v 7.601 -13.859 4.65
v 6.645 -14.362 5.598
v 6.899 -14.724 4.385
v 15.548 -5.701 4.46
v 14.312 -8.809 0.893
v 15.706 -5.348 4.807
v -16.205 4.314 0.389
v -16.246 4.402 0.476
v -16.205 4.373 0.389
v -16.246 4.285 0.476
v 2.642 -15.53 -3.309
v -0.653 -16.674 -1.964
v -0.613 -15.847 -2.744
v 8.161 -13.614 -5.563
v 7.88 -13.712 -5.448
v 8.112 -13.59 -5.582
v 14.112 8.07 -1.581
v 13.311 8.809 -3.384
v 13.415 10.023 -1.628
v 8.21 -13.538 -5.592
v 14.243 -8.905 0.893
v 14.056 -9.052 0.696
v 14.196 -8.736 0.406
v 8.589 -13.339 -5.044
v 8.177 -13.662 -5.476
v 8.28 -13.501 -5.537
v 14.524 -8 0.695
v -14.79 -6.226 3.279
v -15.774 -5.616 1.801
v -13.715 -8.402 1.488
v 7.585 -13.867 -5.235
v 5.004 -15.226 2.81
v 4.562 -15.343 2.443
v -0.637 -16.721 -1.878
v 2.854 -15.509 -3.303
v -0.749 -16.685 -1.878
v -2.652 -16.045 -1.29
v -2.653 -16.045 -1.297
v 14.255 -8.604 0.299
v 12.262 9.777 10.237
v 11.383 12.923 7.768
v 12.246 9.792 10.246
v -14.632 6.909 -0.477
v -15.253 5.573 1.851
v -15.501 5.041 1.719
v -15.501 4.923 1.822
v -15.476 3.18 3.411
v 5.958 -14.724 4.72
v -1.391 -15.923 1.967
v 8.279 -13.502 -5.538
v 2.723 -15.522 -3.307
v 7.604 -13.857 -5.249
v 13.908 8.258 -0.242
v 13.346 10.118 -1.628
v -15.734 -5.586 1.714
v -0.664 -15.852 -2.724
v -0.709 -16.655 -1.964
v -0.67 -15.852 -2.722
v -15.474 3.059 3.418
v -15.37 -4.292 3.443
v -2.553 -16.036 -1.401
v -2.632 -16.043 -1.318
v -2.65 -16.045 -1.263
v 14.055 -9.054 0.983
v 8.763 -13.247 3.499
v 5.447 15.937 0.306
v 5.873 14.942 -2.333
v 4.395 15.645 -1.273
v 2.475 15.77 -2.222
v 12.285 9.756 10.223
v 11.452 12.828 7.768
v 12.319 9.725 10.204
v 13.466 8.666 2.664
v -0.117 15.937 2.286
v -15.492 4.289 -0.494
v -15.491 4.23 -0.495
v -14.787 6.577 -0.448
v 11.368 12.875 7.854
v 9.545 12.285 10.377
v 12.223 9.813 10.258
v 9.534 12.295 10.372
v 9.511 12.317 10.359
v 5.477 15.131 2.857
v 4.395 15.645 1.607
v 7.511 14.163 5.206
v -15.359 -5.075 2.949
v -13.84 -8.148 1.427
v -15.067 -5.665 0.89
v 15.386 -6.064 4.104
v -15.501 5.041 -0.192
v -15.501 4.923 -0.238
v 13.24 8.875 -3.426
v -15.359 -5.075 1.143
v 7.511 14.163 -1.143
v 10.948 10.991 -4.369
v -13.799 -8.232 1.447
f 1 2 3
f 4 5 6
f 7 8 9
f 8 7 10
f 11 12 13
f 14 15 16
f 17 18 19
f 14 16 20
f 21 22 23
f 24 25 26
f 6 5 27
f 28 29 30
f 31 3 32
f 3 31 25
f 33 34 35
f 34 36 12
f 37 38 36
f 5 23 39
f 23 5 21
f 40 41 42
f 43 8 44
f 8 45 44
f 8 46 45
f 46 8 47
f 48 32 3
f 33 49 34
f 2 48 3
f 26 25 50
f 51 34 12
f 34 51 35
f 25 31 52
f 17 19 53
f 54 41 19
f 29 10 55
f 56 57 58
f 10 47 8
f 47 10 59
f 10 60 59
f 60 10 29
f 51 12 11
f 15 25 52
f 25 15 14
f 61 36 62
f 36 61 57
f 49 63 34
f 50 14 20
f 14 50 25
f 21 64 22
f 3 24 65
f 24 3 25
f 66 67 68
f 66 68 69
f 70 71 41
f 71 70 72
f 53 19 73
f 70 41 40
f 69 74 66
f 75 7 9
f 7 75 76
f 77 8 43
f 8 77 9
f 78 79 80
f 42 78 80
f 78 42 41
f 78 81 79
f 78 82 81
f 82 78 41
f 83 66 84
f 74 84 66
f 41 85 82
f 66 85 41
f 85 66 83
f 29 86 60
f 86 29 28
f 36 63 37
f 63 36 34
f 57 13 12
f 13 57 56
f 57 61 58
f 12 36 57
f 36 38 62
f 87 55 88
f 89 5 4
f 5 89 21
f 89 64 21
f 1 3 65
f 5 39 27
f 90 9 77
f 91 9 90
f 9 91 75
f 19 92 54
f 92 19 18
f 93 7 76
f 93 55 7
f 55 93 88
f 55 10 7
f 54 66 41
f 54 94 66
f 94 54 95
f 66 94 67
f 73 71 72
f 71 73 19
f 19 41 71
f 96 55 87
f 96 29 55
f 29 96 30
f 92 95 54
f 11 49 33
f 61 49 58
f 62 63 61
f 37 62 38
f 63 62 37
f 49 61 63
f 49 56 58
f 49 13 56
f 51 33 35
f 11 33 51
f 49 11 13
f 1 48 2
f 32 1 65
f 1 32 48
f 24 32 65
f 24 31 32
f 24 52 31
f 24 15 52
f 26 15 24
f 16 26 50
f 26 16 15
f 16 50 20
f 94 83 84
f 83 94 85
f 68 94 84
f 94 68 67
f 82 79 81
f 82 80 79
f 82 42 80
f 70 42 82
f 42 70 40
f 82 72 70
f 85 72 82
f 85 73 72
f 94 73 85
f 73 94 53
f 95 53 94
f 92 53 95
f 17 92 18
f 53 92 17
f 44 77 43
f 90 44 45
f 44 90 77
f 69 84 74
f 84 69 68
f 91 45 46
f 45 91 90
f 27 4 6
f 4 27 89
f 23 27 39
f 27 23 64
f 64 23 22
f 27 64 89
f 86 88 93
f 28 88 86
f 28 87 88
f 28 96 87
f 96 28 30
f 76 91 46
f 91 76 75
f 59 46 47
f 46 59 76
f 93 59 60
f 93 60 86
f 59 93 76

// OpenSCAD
// Auto-generated OpenSCAD file

    inner_points = 10*[[0.9785360441964507, 0.9685060087804973, -0.7092049571073851], [-0.7218333121630555, -0.9371211507350073, 1.2781211700972077], [-1.1656165136305032, 1.3079692585994611, 0.41648198007898896], [0.12642830900148935, -1.3068898411312557, -0.9853981930688116], [-0.22333094402334933, 1.5535674106354085, 0.6440329700277245], [1.005476703886223, -0.9333113753571688, -0.6892343037094695], [-0.7487739718528278, 0.9646962334026586, 1.2581505166992923], [0.4800336760567444, -1.5221825525899184, -0.07511675703790183], [0.08934767207892022, 1.3107372224336087, -1.012885439345699], [0.48861147976637076, 0.5027013227208416, -1.446090236925663], [-1.5277996843953847, -0.5016219052526364, 0.8771740239358404], [-1.128535876707934, -1.309657804965403, 0.4439692263558762], [0.43644277299934864, 1.5550226153402404, -0.10742995301327285], [1.1958876650432781, 0.018046999695751874, -0.9314344442707686], [-0.939184933009883, 0.013337858349738127, 1.5003506572605914], [-0.17974004096595367, -1.5236377572947502, 0.6763461660030955], [-0.5425111962571489, 1.6183222038887703, -0.3014461589511666], [0.5027750227462976, -0.4971432456893552, -1.4355910431050312], [-1.5419632273753114, 0.4982226631575605, 0.8666748301152085], [-0.4966770083718649, -1.617242786420565, -0.2674700540386561], [1.4826091915535184, 0.7286877016062595, 0.809489031294333], [0.6324245133737653, -0.22412587815149274, 1.8031520948966295], [1.6999608124003458, -0.22177130747848592, 0.5872595441309494], [1.1745177845708672, -0.8106424847112358, 1.2013770908025172], [0.8228354745308205, 0.7272324969014278, 1.5609519543353303], [1.6251024487516763, 0.45780294600218496, -0.14251785987525334], [0.24947474274244444, -1.083881810988317, 1.4652627503986109], [0.7479771108821508, 1.4068067503820987, 0.8311745503291275], [-0.10220756729760253, 0.45399317062434624, 1.824837613931424], [1.317011041769025, -1.0815272403153102, 0.2493701996329309], [-1.0994824342008114, 0.7998110906252263, -0.4422389058083036], [-0.453460022884815, -0.5076184592401323, -1.1431789923822038], [-1.4758291479456198, -0.00993550481667447, 0.007953944227915899], [-1.0765653402581692, -0.8179714045294413, -0.42525085335204815], [-0.4676235658647422, 0.4922261091700644, -1.1536781862028358]];

    outer_points = 10*[[1.6675078734833215, 0.0606578658798944, -0.14037183476169734], [-1.3812010323162374, 0.0606578658798944, 0.9447594765080658], [-0.21947760683013753, 1.5412866403759968, -0.6166289071353418], [-0.0668292343369466, -1.6626023721357857, -0.1877587346110266], [0.5416162372999497, 1.5841976272977822, 0.030591926605881947], [0.6867934666614489, -1.4628818955379934, 0.4384716988297587], [-0.40048662549436476, 1.5841976272977822, 0.36591594291660967], [-0.2553093961328655, -1.4628818955379934, 0.7737957151404864], [1.2830083443582905, 0.43437021059876024, -0.9844685090279552], [1.3301792856223638, -0.5556859423585491, -0.8519403373374261], [-1.616486126789448, 0.43437021059876024, 0.047552695591057736], [-1.5693151855253746, -0.5556859423585491, 0.1800808672815868], [1.3315198473616163, 1.0022572216480545, -0.16279279637858096], [1.421244309499562, -0.8809414898882658, 0.08929076617934018], [-1.1349374683324778, 1.0022572216480545, 0.7150968755670284], [-1.0452130061945322, -0.8809414898882658, 0.9671804381249495], [0.6910920823419752, 1.2353424637267059, -0.8945875406321075], [0.814587209852644, -1.3566581954864947, -0.5476242826794208], [-1.100894051019728, 1.2353424637267059, -0.25676335906694764], [-0.9773989235090593, -1.3566581954864947, 0.09019989888573907], [1.3498755222367103, 0.5145289147819359, 1.3798731287754311], [-0.1744789306630692, 0.5145289147819359, 1.9224387844103128], [1.1036119582529507, -0.4270704409862244, 1.6095357297164685], [0.16150909545863612, -0.4270704409862244, 1.9448597460271964], [0.5599719121750438, 1.0964693204316633, 1.573257851759894], [1.6788523044425723, -0.24077480503880566, 0.8130481402697834], [-0.7876050112515218, -0.24077480503880566, 1.6909378122153926], [1.1352122583646653, 1.2827649563790822, 0.7767702623132089], [-0.38914219453511406, 1.2827649563790822, 1.3193359179480906], [0.4904858776644981, -1.182374160806966, 1.3780347575215486], [-0.10820638536813701, 0.6663583620181512, -1.0879241680961655], [-0.03188219912154147, -0.93558614423774, -0.8734890818340078], [-0.9896228295577276, 0.3604141853688603, -0.7280586200277711], [-0.9424518882936543, -0.629641967588449, -0.595530448337242], [0.483709876648178, -0.13461389110979438, -1.177805136492013]];

    // Convex hull for inner set (I)
    module inner_hull() {
        hull() {
            for (p = inner_points) {
                translate(p) sphere(r=0.1);
            }
        }
    }

    // Convex hull for outer set (O) minus inner hull (O \ I)
    module outer_minus_inner() {
        difference() {
            hull() {
                for (p = outer_points) {
                    translate(p) sphere(r=0.1);
                }
            }
            inner_hull(); // Subtract inner hull
        }
    }

    // Convex hull for outer set (O) minus all translated inner hulls
    module outer_minus_AllTranslationInner() {
        difference() {
            hull() {
                for (p = outer_points) {
                    translate(p) sphere(r=0.1);
                }
            }
            hull() {
                translate([0,0,50]) inner_hull();
                translate([0,0,-50]) inner_hull();
            }; // Subtract translated inner hulls
        }
    }

    // Difference between outer_minus_inner and outer_minus_AllTranslationInner
    module outer_minus_inner_diff() {
        difference() {
            // Outer minus inner
            difference() {
                hull() {
                    for (p = outer_points) {
                        translate(p) sphere(r=0.1);
                    }
                }
                inner_hull();
            }

            // Subtract Outer minus AllTranslationInner
            difference() {
                hull() {
                    for (p = outer_points) {
                        translate(p) sphere(r=0.1);
                    }
                }
                hull() {
                    translate([0,0,50]) inner_hull();
                    translate([0,0,-50]) inner_hull();
                };
            }
        }
    }

    // Rendering all with colors applied
    color([0, 1, 0, 1]) outer_minus_AllTranslationInner(); // Opaque green
    
